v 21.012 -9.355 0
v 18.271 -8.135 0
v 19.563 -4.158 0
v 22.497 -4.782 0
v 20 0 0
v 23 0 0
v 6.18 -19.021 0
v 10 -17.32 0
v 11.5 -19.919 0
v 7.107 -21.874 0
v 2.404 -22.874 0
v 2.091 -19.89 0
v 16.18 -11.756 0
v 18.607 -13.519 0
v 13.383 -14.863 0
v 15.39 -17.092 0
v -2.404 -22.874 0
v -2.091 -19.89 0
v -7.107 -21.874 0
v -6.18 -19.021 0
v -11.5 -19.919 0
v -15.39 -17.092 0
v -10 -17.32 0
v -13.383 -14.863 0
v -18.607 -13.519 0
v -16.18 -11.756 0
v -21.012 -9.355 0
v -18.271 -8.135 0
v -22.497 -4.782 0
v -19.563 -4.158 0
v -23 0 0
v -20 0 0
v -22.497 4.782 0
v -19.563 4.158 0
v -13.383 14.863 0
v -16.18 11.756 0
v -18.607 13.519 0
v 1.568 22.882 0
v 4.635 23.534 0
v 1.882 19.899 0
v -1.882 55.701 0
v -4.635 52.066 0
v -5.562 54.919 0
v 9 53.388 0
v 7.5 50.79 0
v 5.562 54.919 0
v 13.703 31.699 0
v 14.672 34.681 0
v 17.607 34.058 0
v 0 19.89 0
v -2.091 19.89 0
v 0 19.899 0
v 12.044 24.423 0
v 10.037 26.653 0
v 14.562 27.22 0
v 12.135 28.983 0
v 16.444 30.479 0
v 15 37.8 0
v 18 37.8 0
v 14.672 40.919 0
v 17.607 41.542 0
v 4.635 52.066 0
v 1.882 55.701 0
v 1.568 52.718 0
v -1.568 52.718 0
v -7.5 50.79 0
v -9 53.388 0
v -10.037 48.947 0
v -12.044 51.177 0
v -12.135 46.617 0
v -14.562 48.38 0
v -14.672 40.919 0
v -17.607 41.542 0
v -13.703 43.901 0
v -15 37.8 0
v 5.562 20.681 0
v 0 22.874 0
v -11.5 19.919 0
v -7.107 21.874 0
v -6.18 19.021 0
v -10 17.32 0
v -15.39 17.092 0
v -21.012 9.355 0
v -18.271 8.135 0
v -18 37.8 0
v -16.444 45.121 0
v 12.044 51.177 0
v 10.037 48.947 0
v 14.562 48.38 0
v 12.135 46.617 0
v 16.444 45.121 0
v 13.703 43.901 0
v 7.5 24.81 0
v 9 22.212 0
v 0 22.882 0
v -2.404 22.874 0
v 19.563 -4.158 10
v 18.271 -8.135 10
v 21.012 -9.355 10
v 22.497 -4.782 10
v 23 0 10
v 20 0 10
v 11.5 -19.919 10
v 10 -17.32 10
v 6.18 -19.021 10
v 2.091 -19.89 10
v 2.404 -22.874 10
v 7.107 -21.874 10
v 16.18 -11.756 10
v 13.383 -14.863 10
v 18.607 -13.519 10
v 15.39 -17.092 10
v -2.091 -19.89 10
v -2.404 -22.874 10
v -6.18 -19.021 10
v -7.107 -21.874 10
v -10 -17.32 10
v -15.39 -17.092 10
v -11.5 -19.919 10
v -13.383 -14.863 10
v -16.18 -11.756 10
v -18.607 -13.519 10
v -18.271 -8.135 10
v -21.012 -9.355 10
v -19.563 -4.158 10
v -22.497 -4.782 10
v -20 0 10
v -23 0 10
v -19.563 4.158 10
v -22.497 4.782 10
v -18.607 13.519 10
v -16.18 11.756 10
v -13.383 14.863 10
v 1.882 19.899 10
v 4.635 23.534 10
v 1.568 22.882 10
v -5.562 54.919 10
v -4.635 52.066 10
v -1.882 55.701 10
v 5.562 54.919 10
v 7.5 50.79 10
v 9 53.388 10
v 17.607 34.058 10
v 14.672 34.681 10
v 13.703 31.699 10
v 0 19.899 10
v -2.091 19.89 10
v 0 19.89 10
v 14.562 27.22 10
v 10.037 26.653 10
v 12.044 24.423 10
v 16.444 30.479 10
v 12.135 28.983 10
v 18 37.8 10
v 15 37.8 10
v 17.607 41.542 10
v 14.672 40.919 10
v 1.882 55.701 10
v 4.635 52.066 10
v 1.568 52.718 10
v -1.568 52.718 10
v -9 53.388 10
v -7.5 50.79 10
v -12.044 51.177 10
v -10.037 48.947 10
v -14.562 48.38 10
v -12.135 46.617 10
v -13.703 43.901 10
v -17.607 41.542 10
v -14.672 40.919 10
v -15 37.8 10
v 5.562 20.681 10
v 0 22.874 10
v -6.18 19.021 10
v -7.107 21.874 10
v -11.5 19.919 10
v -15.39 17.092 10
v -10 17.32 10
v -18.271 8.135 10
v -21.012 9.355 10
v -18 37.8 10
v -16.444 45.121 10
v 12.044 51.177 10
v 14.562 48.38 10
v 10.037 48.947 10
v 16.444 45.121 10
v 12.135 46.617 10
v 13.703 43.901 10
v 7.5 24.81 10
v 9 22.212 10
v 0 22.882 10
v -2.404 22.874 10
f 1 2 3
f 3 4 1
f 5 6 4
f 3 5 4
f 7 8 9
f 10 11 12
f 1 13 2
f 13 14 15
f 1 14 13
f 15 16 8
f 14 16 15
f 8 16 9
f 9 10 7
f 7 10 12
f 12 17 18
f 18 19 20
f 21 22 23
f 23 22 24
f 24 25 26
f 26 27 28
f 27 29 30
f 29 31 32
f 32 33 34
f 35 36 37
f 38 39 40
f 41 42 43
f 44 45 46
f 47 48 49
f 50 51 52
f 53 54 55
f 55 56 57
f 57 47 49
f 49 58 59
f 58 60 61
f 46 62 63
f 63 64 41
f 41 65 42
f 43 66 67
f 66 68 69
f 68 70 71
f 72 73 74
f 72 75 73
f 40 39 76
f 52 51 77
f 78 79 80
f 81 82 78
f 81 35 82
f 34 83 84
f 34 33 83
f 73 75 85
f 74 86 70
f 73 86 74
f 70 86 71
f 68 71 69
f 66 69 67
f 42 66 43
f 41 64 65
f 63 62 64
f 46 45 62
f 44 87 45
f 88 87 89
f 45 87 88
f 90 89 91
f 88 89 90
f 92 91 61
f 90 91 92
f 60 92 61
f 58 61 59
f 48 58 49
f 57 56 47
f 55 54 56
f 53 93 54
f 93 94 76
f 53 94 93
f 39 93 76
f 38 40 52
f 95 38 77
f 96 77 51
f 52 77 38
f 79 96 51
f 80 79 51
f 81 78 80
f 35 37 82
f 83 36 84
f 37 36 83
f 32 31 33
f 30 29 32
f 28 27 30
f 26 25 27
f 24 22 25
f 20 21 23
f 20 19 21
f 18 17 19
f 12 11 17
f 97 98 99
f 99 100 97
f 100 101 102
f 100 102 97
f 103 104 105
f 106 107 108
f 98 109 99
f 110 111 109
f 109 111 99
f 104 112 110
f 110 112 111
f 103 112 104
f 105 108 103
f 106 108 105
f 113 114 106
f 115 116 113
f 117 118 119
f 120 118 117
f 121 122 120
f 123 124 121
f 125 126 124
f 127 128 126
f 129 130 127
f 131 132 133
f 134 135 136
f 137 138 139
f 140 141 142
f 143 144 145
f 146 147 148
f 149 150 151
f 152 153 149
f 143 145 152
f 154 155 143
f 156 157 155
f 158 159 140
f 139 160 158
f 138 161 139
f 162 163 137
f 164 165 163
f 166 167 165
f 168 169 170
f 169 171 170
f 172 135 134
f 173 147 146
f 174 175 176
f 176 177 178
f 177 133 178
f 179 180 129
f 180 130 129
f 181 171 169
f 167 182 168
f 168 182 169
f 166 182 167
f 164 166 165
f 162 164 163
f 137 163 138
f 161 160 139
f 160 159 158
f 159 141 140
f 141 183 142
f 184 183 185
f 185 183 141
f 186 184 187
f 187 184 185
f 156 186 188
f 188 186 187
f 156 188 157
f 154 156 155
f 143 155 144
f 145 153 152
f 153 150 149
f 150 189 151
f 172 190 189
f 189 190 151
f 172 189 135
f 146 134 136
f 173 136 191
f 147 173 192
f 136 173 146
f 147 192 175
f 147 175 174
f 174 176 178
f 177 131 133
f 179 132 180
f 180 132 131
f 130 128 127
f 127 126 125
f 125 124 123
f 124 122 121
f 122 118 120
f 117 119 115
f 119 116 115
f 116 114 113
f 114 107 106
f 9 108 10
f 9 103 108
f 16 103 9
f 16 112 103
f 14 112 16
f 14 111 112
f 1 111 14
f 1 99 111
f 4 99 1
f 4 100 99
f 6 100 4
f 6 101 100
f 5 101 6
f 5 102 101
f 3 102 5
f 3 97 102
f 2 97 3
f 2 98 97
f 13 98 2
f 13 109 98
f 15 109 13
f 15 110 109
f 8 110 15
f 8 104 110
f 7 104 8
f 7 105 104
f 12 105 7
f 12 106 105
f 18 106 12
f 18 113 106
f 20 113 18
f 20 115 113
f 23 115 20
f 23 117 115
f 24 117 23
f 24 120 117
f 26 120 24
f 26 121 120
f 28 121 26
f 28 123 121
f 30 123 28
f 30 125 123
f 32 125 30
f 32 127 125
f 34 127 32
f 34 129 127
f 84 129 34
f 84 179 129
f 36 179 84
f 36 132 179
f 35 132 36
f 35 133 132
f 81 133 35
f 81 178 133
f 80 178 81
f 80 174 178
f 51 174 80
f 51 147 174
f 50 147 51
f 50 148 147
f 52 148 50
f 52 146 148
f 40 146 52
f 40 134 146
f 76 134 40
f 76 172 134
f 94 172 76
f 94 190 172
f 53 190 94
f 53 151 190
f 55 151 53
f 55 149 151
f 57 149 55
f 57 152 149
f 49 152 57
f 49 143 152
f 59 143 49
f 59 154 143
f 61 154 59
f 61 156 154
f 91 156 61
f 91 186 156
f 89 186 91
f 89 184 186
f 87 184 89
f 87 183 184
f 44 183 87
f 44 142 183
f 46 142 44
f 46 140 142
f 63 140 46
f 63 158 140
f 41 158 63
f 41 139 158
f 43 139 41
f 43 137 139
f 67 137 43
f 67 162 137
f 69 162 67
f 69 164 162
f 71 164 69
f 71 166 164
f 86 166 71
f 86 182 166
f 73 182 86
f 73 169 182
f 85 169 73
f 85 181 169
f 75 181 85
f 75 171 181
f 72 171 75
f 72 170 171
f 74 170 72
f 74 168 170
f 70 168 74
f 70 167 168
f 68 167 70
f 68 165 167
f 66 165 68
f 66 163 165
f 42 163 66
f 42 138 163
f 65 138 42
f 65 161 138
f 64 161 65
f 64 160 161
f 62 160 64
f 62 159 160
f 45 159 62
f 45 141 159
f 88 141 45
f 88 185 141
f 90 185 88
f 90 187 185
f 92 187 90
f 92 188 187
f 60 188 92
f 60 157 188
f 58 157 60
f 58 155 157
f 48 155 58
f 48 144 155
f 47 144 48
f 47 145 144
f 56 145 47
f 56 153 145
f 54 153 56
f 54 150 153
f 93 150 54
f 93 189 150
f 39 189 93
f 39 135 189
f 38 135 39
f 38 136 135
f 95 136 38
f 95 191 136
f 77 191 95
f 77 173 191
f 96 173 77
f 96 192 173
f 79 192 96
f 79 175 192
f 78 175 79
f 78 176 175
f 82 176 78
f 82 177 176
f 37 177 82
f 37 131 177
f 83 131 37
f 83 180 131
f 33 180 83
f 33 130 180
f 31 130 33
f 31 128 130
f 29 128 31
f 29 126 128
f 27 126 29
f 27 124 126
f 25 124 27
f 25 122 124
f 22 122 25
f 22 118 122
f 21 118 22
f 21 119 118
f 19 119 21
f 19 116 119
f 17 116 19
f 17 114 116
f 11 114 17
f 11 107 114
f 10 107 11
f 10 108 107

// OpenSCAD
pole_radius = 20;
Material_thickness = 3;
holder_radius = 15;
height = 10;
linear_extrude( height=height, twist=0, scale=[1, 1], center=false){
  union(){
    difference() {
      difference() {
        circle(r=(pole_radius + Material_thickness));

        circle(r=pole_radius);
      }

      square([1000, 1000], center=false);
    }
    translate([0, ((holder_radius * 2 + Material_thickness) + (pole_radius - holder_radius))-0.2, 0]){
      rotate([0, 0, 180]){
        difference() {
          difference() {
            circle(r=(holder_radius + Material_thickness));

            circle(r=holder_radius);
          }

          square([1000, 1000], center=false);
        }
      }
    }
  }
}
